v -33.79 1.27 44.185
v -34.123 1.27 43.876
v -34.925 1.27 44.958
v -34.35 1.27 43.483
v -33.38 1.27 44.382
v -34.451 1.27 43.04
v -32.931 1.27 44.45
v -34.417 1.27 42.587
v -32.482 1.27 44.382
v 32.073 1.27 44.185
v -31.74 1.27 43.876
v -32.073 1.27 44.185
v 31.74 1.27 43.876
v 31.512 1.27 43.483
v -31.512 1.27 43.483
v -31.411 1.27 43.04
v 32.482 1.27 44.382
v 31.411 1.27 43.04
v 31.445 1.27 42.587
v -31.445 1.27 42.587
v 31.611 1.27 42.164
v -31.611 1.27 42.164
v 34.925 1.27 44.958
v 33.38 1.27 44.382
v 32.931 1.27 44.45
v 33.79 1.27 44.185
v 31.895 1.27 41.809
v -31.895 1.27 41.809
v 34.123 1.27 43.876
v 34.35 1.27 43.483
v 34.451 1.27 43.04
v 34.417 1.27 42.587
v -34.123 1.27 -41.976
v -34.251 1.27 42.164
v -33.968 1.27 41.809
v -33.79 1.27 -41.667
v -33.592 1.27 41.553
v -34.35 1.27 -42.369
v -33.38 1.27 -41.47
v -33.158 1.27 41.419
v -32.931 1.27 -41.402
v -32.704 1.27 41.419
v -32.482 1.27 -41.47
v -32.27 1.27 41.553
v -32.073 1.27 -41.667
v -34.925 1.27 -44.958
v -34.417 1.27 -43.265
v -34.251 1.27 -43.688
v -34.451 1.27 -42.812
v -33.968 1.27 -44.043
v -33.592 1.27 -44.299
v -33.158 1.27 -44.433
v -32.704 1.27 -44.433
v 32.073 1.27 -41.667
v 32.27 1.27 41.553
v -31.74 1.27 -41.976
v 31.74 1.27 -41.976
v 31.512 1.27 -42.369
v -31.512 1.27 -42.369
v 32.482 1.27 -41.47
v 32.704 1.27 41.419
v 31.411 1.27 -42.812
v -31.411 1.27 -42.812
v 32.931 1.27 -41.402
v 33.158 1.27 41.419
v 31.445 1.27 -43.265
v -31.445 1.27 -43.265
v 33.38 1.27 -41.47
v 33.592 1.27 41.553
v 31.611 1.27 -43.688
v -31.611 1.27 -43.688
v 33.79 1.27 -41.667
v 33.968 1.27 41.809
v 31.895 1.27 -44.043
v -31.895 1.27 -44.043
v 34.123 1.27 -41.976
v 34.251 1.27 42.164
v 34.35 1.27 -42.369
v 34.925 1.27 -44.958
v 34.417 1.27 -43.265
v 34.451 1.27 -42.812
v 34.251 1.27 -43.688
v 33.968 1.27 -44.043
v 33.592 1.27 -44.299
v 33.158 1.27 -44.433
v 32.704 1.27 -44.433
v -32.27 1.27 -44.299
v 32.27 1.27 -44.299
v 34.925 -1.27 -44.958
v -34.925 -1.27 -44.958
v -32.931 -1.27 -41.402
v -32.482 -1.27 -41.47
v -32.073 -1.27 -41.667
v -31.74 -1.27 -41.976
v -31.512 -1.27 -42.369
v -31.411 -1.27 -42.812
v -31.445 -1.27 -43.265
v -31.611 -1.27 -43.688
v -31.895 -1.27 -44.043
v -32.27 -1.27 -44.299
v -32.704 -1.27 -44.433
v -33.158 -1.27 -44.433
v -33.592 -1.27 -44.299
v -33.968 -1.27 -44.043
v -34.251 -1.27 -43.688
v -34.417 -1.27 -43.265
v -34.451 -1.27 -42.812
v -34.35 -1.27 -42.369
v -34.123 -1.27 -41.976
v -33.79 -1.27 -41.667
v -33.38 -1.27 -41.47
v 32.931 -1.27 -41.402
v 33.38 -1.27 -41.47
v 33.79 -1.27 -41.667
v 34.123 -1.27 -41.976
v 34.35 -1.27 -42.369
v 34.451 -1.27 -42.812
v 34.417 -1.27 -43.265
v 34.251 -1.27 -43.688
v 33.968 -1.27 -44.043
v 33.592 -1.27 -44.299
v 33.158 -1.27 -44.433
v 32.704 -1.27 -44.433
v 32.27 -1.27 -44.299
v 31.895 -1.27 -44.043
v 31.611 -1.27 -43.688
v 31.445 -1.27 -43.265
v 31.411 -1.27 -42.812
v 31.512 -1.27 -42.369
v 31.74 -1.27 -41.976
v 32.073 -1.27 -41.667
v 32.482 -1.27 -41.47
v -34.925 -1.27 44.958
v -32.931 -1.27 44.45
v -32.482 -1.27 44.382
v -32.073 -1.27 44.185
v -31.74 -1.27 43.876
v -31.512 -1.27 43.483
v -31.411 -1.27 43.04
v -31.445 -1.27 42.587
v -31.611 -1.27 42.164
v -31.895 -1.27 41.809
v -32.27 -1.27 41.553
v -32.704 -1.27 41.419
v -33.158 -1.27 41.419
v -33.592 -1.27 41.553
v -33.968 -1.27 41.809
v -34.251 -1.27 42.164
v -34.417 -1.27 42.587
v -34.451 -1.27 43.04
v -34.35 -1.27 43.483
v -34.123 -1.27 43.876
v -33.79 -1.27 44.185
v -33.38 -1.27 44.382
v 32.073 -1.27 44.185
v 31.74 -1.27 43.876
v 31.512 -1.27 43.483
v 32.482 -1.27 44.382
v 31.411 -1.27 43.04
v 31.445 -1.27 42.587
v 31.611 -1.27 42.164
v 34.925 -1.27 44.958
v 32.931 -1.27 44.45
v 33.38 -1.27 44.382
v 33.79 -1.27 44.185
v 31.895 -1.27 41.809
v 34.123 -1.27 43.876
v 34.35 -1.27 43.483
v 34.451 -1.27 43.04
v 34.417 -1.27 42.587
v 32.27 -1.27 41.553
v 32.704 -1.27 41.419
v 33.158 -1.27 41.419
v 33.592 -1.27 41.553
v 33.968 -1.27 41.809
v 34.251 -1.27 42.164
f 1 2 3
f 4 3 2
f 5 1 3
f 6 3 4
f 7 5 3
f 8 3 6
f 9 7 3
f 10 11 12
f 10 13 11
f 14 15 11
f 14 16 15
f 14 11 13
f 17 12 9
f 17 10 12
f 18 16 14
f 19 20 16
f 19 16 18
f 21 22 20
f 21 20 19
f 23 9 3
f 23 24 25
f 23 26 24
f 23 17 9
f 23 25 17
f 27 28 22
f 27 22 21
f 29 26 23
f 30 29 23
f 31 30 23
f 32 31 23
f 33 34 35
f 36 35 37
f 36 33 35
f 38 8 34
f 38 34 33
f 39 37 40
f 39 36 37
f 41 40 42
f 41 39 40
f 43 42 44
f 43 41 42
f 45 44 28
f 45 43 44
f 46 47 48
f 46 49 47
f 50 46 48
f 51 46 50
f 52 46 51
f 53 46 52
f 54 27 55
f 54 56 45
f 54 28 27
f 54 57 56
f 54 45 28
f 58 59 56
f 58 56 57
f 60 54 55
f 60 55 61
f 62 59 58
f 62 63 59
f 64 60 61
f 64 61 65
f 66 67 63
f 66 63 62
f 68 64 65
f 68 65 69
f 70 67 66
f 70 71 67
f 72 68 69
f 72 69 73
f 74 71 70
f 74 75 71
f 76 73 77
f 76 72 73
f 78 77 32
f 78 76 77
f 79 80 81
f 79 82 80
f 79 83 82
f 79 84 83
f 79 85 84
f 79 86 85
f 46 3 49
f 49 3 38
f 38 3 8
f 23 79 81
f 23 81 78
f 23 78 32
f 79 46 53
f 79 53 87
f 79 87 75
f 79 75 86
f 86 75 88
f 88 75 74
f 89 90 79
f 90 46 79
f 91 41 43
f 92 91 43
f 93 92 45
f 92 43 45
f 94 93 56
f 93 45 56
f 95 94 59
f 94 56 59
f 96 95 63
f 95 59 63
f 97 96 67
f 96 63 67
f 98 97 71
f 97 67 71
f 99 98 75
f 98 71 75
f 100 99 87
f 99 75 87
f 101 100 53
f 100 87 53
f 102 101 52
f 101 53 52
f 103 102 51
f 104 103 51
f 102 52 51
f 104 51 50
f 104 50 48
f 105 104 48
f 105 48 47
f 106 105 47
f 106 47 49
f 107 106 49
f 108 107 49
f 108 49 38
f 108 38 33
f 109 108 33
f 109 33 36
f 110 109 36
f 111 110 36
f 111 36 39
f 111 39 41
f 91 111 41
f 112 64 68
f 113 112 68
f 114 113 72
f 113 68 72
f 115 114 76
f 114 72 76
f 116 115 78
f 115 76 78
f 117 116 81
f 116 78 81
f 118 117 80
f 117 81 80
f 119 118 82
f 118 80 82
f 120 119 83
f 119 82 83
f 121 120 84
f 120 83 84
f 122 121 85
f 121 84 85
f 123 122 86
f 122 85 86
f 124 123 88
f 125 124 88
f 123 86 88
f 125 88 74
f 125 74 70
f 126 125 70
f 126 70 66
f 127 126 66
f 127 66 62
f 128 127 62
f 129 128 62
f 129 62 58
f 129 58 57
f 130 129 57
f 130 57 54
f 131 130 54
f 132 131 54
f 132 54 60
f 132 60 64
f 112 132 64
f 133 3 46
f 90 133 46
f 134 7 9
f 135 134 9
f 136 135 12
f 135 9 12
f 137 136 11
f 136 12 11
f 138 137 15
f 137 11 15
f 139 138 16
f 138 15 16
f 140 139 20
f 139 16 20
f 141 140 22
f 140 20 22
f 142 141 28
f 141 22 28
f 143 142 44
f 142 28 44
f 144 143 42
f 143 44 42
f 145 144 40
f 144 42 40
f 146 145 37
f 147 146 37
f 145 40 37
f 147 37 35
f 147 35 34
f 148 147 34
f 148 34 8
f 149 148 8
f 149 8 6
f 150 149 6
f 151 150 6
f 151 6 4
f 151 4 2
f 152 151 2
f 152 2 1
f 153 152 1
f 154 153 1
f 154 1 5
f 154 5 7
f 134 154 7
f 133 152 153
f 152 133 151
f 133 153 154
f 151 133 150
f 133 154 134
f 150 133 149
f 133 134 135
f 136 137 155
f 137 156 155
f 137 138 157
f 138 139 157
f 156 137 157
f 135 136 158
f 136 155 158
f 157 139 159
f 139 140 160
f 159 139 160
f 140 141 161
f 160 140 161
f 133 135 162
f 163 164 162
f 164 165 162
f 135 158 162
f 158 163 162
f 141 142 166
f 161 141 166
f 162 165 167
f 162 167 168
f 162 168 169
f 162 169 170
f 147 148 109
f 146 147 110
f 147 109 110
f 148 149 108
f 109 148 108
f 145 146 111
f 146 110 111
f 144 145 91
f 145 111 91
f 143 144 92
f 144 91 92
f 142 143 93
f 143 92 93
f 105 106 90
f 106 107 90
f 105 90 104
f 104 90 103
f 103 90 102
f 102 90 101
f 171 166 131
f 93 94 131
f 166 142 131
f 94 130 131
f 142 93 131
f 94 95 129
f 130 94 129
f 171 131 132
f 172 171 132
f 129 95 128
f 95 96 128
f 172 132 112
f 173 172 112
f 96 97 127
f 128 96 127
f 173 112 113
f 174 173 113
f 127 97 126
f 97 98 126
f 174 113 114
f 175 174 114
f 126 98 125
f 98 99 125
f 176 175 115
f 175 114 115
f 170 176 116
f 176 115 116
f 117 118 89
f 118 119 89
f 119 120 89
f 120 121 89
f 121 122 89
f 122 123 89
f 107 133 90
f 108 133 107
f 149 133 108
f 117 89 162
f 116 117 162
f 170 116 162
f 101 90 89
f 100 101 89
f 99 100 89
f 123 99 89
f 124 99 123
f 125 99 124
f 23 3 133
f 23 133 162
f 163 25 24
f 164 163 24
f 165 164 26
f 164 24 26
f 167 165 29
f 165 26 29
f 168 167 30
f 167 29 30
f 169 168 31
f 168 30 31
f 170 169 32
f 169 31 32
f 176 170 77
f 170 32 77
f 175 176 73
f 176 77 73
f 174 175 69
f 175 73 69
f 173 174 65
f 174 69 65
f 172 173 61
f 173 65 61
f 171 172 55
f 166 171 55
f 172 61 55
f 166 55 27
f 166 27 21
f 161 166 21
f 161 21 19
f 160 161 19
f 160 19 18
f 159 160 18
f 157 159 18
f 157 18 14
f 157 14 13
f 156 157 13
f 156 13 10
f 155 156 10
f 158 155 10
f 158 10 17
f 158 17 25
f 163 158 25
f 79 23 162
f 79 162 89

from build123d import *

# Parameters (mm, degrees)
SKETCH1_W           = 69.85
SKETCH1_H           = 89.916
BOSS_EXTRUDE1_DEPTH = 1.27
CUT_EXTRUDE1_REACH  = 58.986
SKETCH2_R           = 1.524


with BuildPart() as part:
    # Sketch1 → Boss-Extrude1 (new, symmetric)
    with BuildSketch(Plane(origin=(0, 0, 0), x_dir=(1, 0, 0), z_dir=(0, 1, 0))):
        Rectangle(SKETCH1_W, SKETCH1_H)
    extrude(amount=BOSS_EXTRUDE1_DEPTH, both=True)

    # Sketch2 → Cut-Extrude1 (cut, up to next)
    with BuildSketch(Plane(origin=(0, 1.27, 0), x_dir=(1, 0, 0), z_dir=(0, 1, 0)), mode=Mode.PRIVATE) as cut_extrude1_sk1:
        with Locations(Location((-32.9311, 42.926, 0), (0, 0, 270))):
            Circle(SKETCH2_R)
    cut_extrude1_tool1 = extrude(cut_extrude1_sk1.sketch, amount=-CUT_EXTRUDE1_REACH, mode=Mode.PRIVATE) & part.part
    # Sketch2 → Cut-Extrude1 (cut, up to next)
    with BuildSketch(Plane(origin=(0, 1.27, 0), x_dir=(1, 0, 0), z_dir=(0, 1, 0)), mode=Mode.PRIVATE) as cut_extrude1_sk2:
        with Locations(Location((32.9311, 42.926, 0), (0, 0, 270))):
            Circle(SKETCH2_R)
    cut_extrude1_tool2 = extrude(cut_extrude1_sk2.sketch, amount=-CUT_EXTRUDE1_REACH, mode=Mode.PRIVATE) & part.part
    # Sketch2 → Cut-Extrude1 (cut, up to next)
    with BuildSketch(Plane(origin=(0, 1.27, 0), x_dir=(1, 0, 0), z_dir=(0, 1, 0)), mode=Mode.PRIVATE) as cut_extrude1_sk3:
        with Locations(Location((32.9311, -42.926, 0), (0, 0, 270))):
            Circle(SKETCH2_R)
    cut_extrude1_tool3 = extrude(cut_extrude1_sk3.sketch, amount=-CUT_EXTRUDE1_REACH, mode=Mode.PRIVATE) & part.part
    # Sketch2 → Cut-Extrude1 (cut, up to next)
    with BuildSketch(Plane(origin=(0, 1.27, 0), x_dir=(1, 0, 0), z_dir=(0, 1, 0)), mode=Mode.PRIVATE) as cut_extrude1_sk4:
        with Locations(Location((-32.9311, -42.926, 0), (0, 0, 270))):
            Circle(SKETCH2_R)
    cut_extrude1_tool4 = extrude(cut_extrude1_sk4.sketch, amount=-CUT_EXTRUDE1_REACH, mode=Mode.PRIVATE) & part.part
    add(cut_extrude1_tool1.solids().sort_by_distance((-32.9311, 1.27, -42.926))[0], mode=Mode.SUBTRACT)
    add(cut_extrude1_tool2.solids().sort_by_distance((32.9311, 1.27, -42.926))[0], mode=Mode.SUBTRACT)
    add(cut_extrude1_tool3.solids().sort_by_distance((32.9311, 1.27, 42.926))[0], mode=Mode.SUBTRACT)
    add(cut_extrude1_tool4.solids().sort_by_distance((-32.9311, 1.27, 42.926))[0], mode=Mode.SUBTRACT)


solid = part.part
